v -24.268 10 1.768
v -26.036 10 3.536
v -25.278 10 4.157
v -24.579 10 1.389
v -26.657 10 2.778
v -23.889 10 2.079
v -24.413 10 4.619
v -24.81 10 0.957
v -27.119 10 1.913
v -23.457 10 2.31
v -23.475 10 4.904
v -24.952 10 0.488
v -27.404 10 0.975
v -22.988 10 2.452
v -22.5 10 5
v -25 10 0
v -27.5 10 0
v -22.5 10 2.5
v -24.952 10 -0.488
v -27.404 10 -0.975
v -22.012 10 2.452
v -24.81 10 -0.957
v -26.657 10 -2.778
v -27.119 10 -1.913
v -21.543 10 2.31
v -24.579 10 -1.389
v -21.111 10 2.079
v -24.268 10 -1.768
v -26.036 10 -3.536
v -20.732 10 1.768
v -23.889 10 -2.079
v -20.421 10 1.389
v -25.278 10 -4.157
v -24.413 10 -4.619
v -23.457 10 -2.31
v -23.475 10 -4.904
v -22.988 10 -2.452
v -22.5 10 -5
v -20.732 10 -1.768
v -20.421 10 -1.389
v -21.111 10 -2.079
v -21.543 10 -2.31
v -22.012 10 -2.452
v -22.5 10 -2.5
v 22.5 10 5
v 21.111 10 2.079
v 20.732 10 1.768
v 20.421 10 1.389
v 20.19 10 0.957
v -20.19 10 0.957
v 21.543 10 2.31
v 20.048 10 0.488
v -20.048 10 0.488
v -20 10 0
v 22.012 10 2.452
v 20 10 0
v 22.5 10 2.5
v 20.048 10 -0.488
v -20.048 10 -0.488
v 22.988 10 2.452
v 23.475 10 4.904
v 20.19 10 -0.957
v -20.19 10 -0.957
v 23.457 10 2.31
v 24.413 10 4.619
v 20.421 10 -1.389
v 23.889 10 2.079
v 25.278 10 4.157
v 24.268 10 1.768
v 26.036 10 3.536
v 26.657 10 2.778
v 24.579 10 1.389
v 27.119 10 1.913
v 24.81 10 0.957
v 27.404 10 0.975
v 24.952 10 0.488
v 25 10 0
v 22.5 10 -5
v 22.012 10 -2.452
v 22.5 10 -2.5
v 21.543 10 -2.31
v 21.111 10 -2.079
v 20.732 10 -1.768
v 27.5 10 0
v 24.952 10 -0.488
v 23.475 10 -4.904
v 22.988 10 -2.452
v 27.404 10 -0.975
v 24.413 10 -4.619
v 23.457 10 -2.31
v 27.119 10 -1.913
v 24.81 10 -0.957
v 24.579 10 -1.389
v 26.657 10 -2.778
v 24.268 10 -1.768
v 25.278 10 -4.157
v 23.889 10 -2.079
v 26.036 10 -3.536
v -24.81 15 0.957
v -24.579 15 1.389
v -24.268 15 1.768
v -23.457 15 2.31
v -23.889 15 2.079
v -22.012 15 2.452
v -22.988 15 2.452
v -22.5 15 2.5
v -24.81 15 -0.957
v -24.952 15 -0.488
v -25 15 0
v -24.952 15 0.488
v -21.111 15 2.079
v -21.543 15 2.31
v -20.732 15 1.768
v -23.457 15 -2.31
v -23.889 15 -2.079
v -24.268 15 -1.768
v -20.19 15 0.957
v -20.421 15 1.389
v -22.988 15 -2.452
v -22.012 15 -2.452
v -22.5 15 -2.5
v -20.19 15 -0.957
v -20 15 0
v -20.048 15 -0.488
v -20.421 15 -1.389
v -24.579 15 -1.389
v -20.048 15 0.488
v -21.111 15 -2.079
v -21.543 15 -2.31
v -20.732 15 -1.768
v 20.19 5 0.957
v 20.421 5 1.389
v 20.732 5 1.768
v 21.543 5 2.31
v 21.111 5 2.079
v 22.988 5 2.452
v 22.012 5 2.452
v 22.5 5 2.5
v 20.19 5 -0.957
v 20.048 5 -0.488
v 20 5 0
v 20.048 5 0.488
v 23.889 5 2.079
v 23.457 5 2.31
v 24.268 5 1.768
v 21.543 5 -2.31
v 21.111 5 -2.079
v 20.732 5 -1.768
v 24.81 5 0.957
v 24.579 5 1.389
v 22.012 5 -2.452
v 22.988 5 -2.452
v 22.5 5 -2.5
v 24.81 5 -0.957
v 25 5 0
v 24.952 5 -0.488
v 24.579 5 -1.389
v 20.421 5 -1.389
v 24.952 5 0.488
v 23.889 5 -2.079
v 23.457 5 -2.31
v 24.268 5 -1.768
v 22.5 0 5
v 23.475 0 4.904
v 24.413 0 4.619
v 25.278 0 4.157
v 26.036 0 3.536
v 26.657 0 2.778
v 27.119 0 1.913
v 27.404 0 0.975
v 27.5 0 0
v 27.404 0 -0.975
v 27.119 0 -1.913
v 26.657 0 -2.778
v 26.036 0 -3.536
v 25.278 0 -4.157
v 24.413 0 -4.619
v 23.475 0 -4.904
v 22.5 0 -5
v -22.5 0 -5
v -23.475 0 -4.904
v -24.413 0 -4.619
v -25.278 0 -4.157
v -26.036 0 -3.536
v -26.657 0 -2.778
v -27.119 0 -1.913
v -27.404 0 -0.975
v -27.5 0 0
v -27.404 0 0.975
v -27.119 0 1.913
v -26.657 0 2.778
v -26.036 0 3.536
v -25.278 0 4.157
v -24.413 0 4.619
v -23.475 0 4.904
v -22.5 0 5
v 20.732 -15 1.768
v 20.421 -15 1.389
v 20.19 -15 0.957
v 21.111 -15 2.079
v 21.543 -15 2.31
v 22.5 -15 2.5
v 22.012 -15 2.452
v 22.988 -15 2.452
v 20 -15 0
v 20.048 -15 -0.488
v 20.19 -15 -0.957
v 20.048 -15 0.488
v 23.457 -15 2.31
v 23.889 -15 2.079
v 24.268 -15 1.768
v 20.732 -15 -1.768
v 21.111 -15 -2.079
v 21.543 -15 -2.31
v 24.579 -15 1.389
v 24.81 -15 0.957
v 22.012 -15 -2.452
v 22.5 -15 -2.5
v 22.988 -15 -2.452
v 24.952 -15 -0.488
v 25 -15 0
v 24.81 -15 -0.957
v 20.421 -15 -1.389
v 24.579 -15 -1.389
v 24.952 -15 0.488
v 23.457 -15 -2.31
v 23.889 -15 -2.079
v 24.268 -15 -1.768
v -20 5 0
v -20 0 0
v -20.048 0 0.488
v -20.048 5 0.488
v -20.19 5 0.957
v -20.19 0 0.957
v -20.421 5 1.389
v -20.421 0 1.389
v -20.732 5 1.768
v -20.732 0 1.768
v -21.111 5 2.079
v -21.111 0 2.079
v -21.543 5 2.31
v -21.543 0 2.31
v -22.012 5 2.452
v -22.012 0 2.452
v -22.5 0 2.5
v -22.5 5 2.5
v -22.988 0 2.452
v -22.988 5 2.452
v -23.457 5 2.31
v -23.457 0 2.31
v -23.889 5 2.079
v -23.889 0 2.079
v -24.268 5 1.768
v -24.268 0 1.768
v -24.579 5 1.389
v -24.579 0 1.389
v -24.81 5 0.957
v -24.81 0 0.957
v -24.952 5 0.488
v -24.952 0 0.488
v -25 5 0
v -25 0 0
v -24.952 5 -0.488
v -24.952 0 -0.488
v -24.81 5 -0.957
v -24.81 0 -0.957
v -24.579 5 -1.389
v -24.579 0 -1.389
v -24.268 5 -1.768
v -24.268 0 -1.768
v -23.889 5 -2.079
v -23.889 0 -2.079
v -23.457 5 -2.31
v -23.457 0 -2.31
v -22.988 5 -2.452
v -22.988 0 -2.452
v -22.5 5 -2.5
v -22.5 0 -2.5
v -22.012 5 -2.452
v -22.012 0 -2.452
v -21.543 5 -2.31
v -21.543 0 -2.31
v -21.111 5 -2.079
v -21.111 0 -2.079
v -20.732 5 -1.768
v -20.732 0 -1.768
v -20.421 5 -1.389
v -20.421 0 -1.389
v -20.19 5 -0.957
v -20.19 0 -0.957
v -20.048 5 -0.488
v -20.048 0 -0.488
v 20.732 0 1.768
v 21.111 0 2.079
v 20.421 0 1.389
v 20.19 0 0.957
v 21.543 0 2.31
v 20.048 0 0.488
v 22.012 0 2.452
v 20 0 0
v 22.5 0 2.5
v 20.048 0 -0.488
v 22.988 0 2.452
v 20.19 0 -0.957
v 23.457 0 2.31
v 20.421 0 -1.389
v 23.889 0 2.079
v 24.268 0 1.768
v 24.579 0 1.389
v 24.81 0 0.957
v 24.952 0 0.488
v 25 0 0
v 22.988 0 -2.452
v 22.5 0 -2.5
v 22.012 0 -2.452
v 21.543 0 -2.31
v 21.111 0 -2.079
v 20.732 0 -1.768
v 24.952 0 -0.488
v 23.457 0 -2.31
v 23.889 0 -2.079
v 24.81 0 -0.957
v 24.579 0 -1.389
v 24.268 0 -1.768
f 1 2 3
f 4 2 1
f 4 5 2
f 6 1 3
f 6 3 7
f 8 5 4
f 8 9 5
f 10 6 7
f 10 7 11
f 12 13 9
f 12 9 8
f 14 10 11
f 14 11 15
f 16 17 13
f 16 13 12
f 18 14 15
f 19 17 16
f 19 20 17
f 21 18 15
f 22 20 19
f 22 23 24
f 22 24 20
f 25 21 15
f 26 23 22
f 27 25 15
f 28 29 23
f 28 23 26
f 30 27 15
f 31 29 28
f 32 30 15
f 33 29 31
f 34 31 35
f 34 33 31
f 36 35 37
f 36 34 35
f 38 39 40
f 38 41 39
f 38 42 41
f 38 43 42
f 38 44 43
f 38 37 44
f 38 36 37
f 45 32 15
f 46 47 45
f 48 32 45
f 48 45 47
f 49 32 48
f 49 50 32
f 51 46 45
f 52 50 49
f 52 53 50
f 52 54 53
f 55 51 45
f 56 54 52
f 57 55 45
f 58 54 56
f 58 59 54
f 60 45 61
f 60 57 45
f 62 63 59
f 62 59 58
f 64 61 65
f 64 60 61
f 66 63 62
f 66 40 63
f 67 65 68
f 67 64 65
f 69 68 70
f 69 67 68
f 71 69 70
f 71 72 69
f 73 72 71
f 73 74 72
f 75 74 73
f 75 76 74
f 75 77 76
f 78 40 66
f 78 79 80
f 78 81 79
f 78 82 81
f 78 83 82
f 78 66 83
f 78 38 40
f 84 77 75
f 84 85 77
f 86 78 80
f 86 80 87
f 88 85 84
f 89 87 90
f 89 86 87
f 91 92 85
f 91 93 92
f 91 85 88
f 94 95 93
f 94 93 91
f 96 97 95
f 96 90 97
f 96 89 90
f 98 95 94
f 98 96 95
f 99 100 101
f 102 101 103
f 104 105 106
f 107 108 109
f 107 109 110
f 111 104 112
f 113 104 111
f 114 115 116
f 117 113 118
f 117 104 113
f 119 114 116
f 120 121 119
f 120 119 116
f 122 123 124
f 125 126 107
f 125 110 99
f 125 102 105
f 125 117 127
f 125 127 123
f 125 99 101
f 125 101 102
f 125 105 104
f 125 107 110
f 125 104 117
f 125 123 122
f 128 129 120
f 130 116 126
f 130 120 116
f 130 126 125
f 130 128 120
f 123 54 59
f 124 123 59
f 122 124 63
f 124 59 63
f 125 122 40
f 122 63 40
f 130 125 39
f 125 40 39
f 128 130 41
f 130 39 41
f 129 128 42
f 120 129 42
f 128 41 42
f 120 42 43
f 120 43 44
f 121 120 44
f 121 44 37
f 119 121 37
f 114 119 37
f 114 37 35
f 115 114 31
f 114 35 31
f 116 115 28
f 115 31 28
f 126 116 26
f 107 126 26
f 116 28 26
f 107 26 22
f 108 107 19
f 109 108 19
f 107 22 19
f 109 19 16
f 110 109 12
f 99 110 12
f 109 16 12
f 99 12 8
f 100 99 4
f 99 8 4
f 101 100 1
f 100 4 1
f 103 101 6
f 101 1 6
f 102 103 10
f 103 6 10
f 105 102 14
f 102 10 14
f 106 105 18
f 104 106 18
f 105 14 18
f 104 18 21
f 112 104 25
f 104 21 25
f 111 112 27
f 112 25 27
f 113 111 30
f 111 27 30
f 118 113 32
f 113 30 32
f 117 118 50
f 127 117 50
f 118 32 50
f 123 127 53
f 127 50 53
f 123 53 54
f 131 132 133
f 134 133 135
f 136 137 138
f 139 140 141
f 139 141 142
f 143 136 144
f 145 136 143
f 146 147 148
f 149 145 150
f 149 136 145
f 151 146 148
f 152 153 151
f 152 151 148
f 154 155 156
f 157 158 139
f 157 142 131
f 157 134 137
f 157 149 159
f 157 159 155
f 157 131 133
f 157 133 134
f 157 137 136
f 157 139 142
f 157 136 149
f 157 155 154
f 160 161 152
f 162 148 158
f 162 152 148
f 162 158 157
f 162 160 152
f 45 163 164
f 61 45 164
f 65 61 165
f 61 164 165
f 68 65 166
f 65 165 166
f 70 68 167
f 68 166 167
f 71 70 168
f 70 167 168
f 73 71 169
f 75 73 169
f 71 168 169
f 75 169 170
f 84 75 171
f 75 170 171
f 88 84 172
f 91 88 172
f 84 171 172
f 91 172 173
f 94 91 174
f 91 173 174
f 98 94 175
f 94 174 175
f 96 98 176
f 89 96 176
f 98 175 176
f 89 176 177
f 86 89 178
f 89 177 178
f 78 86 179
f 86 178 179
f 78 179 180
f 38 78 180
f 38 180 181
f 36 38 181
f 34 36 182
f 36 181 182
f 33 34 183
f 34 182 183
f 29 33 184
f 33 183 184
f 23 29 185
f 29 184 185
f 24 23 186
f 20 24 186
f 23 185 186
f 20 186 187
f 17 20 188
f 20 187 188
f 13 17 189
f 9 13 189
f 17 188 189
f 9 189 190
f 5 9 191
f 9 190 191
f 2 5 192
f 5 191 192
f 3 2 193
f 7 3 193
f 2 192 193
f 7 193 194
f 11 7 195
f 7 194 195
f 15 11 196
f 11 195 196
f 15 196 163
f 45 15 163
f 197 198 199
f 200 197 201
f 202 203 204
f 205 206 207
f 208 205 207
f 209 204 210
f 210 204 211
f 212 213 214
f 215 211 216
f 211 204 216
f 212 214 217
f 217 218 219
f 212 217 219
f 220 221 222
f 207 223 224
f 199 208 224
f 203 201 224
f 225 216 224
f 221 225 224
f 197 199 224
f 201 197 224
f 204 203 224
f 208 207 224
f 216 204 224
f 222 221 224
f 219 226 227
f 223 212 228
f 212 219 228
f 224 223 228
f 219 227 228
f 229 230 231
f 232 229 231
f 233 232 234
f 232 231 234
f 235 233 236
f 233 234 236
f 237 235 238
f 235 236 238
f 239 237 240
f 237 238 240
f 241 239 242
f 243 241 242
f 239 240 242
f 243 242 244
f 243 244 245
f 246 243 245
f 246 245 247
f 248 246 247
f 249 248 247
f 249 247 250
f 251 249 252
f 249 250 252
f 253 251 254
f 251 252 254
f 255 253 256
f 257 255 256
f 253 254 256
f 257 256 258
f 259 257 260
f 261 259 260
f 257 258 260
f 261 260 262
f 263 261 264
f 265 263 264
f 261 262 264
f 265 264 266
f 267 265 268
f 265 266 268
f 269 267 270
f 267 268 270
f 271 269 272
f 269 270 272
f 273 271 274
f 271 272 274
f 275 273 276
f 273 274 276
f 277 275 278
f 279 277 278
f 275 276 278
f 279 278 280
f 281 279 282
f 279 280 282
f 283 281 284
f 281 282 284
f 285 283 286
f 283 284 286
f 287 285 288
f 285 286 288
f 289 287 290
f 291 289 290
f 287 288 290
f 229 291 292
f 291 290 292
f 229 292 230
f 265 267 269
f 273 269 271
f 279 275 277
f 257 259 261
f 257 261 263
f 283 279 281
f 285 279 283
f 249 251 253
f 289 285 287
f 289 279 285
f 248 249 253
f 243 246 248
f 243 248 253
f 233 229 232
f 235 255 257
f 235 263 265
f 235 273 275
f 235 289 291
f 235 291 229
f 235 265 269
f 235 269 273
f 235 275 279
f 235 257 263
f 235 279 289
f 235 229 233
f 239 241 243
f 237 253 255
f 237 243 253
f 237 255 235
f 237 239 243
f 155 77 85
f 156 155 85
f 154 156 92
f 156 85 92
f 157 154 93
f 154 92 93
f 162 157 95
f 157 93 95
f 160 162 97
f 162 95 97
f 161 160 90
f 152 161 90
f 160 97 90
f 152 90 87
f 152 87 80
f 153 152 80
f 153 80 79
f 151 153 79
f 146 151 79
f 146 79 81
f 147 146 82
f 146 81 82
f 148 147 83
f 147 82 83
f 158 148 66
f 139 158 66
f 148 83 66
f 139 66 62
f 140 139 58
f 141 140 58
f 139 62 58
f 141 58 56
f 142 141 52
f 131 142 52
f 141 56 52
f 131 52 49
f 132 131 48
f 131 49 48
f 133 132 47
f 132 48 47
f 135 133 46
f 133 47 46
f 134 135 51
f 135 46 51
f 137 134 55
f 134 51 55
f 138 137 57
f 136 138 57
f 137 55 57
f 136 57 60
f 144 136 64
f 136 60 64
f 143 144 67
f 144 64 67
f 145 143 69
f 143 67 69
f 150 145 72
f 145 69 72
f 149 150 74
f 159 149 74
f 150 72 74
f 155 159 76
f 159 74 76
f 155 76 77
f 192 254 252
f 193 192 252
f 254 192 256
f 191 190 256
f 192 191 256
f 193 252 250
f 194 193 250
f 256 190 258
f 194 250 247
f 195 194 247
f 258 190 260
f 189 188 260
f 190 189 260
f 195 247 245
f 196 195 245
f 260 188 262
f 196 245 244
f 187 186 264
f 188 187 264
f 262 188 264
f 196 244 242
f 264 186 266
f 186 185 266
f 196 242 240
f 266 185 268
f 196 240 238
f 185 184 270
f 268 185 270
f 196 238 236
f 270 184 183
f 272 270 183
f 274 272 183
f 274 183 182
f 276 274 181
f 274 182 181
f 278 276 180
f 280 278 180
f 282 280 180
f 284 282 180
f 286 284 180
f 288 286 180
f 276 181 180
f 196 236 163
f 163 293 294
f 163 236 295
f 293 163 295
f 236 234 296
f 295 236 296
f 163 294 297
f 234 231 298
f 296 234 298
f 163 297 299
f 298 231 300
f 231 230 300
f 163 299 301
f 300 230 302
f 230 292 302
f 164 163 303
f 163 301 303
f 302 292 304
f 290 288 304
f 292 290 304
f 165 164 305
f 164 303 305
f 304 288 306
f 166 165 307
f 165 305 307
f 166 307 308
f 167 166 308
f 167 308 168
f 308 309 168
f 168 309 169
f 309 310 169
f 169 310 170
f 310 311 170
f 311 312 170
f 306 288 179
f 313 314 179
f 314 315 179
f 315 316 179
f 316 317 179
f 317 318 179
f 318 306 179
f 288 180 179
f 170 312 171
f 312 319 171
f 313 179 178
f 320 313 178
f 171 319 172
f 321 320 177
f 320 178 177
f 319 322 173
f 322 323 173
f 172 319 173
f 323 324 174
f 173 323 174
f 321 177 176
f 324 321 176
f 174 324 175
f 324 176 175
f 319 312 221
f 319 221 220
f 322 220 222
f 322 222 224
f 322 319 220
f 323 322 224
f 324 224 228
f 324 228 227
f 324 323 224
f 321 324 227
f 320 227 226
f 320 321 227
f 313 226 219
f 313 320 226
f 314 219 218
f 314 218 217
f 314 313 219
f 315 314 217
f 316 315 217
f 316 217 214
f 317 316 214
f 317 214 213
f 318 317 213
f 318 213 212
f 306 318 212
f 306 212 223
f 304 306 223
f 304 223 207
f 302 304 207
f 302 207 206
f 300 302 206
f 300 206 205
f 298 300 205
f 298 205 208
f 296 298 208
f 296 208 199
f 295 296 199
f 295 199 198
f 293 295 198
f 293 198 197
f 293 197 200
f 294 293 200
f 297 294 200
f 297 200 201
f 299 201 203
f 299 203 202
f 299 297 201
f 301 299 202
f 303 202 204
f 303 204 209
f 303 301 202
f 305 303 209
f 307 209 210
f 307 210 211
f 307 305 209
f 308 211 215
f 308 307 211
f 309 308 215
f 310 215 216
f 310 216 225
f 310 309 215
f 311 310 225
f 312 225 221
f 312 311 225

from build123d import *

# Parameters (mm, degrees)
BOSS_EXTRUDE1_DEPTH = 10
SKETCH2_R           = 2.5
BOSS_EXTRUDE2_DEPTH = 5
SKETCH3_R           = 2.5
BOSS_EXTRUDE3_DEPTH = 25
SKETCH5_R           = 2.5
CUT_EXTRUDE1_DEPTH  = 5
SKETCH4_R           = 2.5
CUT_EXTRUDE2_DEPTH  = 5


with BuildPart() as part:
    # Sketch1 → Boss-Extrude1 (new body)
    with BuildSketch(Plane(origin=(0, 0, 0), x_dir=(1, 0, 0), z_dir=(0, 1, 0))):
        with BuildLine():
            Line((-22.5, -5), (22.5, -5))
            ThreePointArc((22.5, -5), (27.5, 0), (22.5, 5))
            Line((22.5, 5), (-22.5, 5))
            ThreePointArc((-22.5, 5), (-27.5, 0), (-22.5, -5))
        make_face()
    extrude(amount=BOSS_EXTRUDE1_DEPTH)

    # Sketch2 → Boss-Extrude2 (add)
    with BuildSketch(Plane(origin=(0, 10, 0), x_dir=(1, 0, 0), z_dir=(0, 1, 0))):
        with Locations((-22.5, 0)):
            Circle(SKETCH2_R)
    extrude(amount=BOSS_EXTRUDE2_DEPTH)

    # Sketch3 → Boss-Extrude3 (add)
    with BuildSketch(Plane(origin=(0, 10, 0), x_dir=(1, 0, 0), z_dir=(0, 1, 0))):
        with Locations((22.5, 0)):
            Circle(SKETCH3_R)
    extrude(amount=-BOSS_EXTRUDE3_DEPTH)

    # Sketch5 → Cut-Extrude1 (cut)
    with BuildSketch(Plane.XZ):
        with Locations((-22.5, 0)):
            Circle(SKETCH5_R)
    extrude(amount=-CUT_EXTRUDE1_DEPTH, mode=Mode.SUBTRACT)

    # Sketch4 → Cut-Extrude2 (cut)
    with BuildSketch(Plane(origin=(0, 10, 0), x_dir=(1, 0, 0), z_dir=(0, 1, 0))):
        with Locations((22.5, 0)):
            Circle(SKETCH4_R)
    extrude(amount=-CUT_EXTRUDE2_DEPTH, mode=Mode.SUBTRACT)


solid = part.part
